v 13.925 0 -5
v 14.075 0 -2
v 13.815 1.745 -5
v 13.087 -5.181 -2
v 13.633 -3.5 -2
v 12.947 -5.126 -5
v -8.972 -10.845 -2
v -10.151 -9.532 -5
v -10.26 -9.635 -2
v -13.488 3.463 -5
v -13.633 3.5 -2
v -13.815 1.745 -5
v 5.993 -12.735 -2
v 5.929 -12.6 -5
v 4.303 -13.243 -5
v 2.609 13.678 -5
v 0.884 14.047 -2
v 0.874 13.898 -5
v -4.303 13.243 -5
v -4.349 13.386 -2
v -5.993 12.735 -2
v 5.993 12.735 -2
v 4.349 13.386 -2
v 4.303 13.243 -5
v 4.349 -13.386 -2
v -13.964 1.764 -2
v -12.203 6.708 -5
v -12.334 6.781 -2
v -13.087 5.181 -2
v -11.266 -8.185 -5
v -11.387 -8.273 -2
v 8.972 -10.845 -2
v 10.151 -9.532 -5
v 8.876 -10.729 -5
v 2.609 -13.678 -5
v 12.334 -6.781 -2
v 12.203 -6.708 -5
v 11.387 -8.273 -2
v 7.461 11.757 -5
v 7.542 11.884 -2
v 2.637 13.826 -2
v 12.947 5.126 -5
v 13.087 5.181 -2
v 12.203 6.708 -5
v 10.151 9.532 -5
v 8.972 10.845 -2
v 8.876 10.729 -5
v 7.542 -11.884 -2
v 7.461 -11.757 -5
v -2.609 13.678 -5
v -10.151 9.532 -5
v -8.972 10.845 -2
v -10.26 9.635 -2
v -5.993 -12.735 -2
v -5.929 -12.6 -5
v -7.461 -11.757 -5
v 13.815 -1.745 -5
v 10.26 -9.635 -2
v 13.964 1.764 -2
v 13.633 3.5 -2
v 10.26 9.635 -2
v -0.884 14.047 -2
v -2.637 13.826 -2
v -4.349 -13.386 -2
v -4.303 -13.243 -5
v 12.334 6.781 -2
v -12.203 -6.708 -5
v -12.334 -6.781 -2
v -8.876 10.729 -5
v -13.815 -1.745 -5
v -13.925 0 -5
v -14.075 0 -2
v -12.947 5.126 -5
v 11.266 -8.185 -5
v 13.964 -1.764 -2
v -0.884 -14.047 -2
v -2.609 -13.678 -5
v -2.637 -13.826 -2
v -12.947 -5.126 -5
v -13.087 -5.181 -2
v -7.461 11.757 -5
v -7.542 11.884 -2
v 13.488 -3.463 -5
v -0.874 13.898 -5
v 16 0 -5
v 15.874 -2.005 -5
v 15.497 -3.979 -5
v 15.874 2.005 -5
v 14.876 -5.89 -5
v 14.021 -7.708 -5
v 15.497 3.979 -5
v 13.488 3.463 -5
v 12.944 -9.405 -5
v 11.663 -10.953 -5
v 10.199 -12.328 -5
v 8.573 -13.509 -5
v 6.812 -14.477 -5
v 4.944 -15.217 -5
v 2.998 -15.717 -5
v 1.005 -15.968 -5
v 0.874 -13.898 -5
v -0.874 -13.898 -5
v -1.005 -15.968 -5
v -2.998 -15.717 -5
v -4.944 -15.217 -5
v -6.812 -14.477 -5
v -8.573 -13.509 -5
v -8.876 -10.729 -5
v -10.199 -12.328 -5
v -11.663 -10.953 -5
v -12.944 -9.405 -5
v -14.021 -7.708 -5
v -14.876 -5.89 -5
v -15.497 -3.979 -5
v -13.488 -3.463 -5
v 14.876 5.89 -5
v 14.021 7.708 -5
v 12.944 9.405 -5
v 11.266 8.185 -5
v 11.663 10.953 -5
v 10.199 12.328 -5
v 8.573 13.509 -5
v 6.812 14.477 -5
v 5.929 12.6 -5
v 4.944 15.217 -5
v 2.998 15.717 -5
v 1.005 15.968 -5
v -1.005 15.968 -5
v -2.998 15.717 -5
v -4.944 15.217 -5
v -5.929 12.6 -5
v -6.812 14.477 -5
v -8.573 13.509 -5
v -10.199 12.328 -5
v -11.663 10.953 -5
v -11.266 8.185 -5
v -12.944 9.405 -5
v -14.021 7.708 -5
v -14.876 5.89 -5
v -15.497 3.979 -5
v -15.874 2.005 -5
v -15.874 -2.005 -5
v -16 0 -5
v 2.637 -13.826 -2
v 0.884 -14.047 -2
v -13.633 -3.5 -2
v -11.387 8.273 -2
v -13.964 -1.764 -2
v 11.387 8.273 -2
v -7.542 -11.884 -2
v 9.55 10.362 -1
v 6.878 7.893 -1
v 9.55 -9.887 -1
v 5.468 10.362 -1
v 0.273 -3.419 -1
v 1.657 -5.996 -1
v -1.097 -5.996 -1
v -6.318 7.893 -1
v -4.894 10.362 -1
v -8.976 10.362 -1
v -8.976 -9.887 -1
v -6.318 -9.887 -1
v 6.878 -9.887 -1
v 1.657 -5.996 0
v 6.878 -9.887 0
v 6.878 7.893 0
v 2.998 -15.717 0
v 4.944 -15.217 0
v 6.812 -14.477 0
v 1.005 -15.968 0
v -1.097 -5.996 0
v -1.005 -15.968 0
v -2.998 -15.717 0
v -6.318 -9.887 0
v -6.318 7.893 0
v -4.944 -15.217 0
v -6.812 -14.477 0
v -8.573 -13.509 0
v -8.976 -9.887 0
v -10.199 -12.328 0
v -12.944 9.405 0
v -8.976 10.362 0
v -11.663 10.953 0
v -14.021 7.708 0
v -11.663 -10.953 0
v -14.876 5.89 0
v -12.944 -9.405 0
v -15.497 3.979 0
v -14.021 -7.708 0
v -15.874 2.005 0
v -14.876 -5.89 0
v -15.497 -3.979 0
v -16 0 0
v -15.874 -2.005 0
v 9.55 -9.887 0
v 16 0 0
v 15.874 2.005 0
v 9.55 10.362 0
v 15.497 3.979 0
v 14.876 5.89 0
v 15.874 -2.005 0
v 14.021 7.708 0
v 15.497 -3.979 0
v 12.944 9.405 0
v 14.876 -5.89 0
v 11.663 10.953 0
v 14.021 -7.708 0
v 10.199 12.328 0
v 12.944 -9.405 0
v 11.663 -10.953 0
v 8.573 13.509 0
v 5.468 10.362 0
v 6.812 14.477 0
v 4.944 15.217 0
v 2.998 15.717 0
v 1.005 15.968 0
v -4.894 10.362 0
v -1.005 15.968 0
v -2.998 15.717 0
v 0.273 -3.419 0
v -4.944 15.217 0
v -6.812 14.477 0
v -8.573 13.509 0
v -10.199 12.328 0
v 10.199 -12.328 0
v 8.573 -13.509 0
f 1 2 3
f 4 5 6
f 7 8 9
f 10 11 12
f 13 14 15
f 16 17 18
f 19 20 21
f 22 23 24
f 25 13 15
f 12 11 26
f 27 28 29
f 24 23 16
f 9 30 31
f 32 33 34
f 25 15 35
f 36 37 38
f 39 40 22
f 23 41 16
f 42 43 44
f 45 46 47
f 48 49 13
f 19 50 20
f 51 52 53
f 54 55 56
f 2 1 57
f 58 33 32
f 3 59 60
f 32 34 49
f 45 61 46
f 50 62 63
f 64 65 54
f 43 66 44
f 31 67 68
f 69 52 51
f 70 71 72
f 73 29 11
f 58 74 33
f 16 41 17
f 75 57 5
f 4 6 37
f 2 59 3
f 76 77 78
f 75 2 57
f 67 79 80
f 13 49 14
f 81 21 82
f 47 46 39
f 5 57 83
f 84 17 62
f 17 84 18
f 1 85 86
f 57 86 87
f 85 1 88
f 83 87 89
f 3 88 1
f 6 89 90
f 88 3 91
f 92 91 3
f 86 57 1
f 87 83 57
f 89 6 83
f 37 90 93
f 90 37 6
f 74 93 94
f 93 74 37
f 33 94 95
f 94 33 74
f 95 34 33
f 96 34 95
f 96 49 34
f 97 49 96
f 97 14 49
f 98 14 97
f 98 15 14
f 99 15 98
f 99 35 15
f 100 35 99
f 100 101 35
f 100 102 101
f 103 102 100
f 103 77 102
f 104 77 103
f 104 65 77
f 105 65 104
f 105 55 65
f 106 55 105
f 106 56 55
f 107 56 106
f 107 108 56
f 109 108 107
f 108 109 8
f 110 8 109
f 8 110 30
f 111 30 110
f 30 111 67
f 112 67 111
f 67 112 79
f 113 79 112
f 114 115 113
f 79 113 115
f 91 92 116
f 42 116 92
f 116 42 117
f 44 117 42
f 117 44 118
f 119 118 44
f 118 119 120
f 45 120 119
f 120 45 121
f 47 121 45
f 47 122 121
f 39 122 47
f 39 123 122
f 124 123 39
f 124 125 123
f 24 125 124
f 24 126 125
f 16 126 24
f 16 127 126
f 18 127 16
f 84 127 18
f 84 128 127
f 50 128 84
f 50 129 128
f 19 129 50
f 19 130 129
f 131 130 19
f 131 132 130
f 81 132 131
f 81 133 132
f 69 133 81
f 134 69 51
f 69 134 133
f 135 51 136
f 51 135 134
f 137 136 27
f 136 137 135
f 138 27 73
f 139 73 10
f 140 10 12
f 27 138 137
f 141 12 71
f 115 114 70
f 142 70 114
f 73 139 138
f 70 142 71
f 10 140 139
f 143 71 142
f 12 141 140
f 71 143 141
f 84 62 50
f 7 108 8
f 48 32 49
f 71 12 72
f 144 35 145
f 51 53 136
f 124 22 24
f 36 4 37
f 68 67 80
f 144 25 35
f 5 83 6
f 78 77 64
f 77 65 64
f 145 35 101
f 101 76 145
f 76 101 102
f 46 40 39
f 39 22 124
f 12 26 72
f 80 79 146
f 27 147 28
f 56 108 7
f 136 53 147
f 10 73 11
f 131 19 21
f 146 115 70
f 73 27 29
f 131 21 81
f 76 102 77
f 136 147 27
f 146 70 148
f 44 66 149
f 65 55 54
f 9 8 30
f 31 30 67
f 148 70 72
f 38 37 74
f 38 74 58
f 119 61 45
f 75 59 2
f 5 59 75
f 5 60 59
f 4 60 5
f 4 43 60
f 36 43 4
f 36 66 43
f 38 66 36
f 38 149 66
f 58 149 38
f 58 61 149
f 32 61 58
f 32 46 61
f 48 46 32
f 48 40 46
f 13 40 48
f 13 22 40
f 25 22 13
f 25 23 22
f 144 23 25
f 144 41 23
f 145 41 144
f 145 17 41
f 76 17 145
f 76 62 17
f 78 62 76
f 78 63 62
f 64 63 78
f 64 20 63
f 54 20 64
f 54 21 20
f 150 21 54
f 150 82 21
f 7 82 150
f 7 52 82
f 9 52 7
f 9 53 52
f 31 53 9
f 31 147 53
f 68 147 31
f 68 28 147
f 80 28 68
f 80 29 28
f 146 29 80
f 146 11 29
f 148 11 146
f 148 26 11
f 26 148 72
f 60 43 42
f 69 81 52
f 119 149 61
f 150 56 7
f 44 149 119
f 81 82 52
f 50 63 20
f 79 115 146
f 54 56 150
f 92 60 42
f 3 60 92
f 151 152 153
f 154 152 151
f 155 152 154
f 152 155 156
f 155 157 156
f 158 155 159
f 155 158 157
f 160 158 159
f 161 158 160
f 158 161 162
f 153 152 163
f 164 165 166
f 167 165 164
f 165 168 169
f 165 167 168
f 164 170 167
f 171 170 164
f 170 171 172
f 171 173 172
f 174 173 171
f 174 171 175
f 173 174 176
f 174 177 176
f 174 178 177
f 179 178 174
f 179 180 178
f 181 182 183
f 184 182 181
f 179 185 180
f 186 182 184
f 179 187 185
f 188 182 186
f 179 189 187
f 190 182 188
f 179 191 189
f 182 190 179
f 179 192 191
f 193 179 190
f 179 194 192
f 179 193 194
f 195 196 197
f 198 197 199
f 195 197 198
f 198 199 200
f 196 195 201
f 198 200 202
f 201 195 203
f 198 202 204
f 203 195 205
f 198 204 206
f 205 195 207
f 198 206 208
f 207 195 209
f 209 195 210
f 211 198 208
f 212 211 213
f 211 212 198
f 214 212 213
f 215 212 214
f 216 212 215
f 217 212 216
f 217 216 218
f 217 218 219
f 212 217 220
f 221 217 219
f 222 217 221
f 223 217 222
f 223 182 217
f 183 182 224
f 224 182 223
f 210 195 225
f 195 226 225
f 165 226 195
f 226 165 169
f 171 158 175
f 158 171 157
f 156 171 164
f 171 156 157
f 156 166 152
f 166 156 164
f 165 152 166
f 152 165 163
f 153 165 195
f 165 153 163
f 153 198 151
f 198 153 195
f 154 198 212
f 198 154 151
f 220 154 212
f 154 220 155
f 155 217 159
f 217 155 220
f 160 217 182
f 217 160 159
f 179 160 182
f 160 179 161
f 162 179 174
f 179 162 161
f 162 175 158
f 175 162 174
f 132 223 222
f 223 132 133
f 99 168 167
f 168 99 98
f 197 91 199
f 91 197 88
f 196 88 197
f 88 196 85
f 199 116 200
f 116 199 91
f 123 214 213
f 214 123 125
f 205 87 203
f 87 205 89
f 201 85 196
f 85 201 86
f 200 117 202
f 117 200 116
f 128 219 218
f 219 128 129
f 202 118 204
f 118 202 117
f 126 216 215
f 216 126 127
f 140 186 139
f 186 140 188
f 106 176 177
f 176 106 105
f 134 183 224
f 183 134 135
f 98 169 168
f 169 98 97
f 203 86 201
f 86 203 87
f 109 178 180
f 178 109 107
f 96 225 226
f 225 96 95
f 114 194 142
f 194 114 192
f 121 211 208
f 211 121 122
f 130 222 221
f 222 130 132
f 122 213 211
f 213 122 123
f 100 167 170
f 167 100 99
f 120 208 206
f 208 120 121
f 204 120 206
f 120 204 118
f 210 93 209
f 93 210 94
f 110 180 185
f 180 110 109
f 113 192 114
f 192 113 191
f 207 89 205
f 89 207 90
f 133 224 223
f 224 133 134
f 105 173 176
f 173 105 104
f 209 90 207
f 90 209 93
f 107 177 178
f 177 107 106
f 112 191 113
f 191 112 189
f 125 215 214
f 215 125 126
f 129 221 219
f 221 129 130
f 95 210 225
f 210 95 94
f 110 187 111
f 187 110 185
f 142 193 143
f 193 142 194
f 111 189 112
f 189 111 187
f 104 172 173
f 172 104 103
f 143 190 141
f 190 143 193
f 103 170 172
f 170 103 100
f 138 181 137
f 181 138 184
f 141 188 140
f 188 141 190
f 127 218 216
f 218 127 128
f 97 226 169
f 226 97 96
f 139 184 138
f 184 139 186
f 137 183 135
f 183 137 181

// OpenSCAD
$fn = 50;


difference() {
	union() {
		translate(v = [0, 0, -5.0000000000]) {
			cylinder(h = 5, r = 16.0000000000);
		}
	}
	union() {
		#translate(v = [0, 0, -5.0000000000]) {
			cylinder(h = 3, r1 = 13.9250000000, r2 = 14.0750000000);
		}
		translate(v = [0, 0, -1]) {
			linear_extrude(height = 1) {
				text(font = "Impact", halign = "center", size = 20, text = "M", valign = "center");
			}
		}
	}
}
